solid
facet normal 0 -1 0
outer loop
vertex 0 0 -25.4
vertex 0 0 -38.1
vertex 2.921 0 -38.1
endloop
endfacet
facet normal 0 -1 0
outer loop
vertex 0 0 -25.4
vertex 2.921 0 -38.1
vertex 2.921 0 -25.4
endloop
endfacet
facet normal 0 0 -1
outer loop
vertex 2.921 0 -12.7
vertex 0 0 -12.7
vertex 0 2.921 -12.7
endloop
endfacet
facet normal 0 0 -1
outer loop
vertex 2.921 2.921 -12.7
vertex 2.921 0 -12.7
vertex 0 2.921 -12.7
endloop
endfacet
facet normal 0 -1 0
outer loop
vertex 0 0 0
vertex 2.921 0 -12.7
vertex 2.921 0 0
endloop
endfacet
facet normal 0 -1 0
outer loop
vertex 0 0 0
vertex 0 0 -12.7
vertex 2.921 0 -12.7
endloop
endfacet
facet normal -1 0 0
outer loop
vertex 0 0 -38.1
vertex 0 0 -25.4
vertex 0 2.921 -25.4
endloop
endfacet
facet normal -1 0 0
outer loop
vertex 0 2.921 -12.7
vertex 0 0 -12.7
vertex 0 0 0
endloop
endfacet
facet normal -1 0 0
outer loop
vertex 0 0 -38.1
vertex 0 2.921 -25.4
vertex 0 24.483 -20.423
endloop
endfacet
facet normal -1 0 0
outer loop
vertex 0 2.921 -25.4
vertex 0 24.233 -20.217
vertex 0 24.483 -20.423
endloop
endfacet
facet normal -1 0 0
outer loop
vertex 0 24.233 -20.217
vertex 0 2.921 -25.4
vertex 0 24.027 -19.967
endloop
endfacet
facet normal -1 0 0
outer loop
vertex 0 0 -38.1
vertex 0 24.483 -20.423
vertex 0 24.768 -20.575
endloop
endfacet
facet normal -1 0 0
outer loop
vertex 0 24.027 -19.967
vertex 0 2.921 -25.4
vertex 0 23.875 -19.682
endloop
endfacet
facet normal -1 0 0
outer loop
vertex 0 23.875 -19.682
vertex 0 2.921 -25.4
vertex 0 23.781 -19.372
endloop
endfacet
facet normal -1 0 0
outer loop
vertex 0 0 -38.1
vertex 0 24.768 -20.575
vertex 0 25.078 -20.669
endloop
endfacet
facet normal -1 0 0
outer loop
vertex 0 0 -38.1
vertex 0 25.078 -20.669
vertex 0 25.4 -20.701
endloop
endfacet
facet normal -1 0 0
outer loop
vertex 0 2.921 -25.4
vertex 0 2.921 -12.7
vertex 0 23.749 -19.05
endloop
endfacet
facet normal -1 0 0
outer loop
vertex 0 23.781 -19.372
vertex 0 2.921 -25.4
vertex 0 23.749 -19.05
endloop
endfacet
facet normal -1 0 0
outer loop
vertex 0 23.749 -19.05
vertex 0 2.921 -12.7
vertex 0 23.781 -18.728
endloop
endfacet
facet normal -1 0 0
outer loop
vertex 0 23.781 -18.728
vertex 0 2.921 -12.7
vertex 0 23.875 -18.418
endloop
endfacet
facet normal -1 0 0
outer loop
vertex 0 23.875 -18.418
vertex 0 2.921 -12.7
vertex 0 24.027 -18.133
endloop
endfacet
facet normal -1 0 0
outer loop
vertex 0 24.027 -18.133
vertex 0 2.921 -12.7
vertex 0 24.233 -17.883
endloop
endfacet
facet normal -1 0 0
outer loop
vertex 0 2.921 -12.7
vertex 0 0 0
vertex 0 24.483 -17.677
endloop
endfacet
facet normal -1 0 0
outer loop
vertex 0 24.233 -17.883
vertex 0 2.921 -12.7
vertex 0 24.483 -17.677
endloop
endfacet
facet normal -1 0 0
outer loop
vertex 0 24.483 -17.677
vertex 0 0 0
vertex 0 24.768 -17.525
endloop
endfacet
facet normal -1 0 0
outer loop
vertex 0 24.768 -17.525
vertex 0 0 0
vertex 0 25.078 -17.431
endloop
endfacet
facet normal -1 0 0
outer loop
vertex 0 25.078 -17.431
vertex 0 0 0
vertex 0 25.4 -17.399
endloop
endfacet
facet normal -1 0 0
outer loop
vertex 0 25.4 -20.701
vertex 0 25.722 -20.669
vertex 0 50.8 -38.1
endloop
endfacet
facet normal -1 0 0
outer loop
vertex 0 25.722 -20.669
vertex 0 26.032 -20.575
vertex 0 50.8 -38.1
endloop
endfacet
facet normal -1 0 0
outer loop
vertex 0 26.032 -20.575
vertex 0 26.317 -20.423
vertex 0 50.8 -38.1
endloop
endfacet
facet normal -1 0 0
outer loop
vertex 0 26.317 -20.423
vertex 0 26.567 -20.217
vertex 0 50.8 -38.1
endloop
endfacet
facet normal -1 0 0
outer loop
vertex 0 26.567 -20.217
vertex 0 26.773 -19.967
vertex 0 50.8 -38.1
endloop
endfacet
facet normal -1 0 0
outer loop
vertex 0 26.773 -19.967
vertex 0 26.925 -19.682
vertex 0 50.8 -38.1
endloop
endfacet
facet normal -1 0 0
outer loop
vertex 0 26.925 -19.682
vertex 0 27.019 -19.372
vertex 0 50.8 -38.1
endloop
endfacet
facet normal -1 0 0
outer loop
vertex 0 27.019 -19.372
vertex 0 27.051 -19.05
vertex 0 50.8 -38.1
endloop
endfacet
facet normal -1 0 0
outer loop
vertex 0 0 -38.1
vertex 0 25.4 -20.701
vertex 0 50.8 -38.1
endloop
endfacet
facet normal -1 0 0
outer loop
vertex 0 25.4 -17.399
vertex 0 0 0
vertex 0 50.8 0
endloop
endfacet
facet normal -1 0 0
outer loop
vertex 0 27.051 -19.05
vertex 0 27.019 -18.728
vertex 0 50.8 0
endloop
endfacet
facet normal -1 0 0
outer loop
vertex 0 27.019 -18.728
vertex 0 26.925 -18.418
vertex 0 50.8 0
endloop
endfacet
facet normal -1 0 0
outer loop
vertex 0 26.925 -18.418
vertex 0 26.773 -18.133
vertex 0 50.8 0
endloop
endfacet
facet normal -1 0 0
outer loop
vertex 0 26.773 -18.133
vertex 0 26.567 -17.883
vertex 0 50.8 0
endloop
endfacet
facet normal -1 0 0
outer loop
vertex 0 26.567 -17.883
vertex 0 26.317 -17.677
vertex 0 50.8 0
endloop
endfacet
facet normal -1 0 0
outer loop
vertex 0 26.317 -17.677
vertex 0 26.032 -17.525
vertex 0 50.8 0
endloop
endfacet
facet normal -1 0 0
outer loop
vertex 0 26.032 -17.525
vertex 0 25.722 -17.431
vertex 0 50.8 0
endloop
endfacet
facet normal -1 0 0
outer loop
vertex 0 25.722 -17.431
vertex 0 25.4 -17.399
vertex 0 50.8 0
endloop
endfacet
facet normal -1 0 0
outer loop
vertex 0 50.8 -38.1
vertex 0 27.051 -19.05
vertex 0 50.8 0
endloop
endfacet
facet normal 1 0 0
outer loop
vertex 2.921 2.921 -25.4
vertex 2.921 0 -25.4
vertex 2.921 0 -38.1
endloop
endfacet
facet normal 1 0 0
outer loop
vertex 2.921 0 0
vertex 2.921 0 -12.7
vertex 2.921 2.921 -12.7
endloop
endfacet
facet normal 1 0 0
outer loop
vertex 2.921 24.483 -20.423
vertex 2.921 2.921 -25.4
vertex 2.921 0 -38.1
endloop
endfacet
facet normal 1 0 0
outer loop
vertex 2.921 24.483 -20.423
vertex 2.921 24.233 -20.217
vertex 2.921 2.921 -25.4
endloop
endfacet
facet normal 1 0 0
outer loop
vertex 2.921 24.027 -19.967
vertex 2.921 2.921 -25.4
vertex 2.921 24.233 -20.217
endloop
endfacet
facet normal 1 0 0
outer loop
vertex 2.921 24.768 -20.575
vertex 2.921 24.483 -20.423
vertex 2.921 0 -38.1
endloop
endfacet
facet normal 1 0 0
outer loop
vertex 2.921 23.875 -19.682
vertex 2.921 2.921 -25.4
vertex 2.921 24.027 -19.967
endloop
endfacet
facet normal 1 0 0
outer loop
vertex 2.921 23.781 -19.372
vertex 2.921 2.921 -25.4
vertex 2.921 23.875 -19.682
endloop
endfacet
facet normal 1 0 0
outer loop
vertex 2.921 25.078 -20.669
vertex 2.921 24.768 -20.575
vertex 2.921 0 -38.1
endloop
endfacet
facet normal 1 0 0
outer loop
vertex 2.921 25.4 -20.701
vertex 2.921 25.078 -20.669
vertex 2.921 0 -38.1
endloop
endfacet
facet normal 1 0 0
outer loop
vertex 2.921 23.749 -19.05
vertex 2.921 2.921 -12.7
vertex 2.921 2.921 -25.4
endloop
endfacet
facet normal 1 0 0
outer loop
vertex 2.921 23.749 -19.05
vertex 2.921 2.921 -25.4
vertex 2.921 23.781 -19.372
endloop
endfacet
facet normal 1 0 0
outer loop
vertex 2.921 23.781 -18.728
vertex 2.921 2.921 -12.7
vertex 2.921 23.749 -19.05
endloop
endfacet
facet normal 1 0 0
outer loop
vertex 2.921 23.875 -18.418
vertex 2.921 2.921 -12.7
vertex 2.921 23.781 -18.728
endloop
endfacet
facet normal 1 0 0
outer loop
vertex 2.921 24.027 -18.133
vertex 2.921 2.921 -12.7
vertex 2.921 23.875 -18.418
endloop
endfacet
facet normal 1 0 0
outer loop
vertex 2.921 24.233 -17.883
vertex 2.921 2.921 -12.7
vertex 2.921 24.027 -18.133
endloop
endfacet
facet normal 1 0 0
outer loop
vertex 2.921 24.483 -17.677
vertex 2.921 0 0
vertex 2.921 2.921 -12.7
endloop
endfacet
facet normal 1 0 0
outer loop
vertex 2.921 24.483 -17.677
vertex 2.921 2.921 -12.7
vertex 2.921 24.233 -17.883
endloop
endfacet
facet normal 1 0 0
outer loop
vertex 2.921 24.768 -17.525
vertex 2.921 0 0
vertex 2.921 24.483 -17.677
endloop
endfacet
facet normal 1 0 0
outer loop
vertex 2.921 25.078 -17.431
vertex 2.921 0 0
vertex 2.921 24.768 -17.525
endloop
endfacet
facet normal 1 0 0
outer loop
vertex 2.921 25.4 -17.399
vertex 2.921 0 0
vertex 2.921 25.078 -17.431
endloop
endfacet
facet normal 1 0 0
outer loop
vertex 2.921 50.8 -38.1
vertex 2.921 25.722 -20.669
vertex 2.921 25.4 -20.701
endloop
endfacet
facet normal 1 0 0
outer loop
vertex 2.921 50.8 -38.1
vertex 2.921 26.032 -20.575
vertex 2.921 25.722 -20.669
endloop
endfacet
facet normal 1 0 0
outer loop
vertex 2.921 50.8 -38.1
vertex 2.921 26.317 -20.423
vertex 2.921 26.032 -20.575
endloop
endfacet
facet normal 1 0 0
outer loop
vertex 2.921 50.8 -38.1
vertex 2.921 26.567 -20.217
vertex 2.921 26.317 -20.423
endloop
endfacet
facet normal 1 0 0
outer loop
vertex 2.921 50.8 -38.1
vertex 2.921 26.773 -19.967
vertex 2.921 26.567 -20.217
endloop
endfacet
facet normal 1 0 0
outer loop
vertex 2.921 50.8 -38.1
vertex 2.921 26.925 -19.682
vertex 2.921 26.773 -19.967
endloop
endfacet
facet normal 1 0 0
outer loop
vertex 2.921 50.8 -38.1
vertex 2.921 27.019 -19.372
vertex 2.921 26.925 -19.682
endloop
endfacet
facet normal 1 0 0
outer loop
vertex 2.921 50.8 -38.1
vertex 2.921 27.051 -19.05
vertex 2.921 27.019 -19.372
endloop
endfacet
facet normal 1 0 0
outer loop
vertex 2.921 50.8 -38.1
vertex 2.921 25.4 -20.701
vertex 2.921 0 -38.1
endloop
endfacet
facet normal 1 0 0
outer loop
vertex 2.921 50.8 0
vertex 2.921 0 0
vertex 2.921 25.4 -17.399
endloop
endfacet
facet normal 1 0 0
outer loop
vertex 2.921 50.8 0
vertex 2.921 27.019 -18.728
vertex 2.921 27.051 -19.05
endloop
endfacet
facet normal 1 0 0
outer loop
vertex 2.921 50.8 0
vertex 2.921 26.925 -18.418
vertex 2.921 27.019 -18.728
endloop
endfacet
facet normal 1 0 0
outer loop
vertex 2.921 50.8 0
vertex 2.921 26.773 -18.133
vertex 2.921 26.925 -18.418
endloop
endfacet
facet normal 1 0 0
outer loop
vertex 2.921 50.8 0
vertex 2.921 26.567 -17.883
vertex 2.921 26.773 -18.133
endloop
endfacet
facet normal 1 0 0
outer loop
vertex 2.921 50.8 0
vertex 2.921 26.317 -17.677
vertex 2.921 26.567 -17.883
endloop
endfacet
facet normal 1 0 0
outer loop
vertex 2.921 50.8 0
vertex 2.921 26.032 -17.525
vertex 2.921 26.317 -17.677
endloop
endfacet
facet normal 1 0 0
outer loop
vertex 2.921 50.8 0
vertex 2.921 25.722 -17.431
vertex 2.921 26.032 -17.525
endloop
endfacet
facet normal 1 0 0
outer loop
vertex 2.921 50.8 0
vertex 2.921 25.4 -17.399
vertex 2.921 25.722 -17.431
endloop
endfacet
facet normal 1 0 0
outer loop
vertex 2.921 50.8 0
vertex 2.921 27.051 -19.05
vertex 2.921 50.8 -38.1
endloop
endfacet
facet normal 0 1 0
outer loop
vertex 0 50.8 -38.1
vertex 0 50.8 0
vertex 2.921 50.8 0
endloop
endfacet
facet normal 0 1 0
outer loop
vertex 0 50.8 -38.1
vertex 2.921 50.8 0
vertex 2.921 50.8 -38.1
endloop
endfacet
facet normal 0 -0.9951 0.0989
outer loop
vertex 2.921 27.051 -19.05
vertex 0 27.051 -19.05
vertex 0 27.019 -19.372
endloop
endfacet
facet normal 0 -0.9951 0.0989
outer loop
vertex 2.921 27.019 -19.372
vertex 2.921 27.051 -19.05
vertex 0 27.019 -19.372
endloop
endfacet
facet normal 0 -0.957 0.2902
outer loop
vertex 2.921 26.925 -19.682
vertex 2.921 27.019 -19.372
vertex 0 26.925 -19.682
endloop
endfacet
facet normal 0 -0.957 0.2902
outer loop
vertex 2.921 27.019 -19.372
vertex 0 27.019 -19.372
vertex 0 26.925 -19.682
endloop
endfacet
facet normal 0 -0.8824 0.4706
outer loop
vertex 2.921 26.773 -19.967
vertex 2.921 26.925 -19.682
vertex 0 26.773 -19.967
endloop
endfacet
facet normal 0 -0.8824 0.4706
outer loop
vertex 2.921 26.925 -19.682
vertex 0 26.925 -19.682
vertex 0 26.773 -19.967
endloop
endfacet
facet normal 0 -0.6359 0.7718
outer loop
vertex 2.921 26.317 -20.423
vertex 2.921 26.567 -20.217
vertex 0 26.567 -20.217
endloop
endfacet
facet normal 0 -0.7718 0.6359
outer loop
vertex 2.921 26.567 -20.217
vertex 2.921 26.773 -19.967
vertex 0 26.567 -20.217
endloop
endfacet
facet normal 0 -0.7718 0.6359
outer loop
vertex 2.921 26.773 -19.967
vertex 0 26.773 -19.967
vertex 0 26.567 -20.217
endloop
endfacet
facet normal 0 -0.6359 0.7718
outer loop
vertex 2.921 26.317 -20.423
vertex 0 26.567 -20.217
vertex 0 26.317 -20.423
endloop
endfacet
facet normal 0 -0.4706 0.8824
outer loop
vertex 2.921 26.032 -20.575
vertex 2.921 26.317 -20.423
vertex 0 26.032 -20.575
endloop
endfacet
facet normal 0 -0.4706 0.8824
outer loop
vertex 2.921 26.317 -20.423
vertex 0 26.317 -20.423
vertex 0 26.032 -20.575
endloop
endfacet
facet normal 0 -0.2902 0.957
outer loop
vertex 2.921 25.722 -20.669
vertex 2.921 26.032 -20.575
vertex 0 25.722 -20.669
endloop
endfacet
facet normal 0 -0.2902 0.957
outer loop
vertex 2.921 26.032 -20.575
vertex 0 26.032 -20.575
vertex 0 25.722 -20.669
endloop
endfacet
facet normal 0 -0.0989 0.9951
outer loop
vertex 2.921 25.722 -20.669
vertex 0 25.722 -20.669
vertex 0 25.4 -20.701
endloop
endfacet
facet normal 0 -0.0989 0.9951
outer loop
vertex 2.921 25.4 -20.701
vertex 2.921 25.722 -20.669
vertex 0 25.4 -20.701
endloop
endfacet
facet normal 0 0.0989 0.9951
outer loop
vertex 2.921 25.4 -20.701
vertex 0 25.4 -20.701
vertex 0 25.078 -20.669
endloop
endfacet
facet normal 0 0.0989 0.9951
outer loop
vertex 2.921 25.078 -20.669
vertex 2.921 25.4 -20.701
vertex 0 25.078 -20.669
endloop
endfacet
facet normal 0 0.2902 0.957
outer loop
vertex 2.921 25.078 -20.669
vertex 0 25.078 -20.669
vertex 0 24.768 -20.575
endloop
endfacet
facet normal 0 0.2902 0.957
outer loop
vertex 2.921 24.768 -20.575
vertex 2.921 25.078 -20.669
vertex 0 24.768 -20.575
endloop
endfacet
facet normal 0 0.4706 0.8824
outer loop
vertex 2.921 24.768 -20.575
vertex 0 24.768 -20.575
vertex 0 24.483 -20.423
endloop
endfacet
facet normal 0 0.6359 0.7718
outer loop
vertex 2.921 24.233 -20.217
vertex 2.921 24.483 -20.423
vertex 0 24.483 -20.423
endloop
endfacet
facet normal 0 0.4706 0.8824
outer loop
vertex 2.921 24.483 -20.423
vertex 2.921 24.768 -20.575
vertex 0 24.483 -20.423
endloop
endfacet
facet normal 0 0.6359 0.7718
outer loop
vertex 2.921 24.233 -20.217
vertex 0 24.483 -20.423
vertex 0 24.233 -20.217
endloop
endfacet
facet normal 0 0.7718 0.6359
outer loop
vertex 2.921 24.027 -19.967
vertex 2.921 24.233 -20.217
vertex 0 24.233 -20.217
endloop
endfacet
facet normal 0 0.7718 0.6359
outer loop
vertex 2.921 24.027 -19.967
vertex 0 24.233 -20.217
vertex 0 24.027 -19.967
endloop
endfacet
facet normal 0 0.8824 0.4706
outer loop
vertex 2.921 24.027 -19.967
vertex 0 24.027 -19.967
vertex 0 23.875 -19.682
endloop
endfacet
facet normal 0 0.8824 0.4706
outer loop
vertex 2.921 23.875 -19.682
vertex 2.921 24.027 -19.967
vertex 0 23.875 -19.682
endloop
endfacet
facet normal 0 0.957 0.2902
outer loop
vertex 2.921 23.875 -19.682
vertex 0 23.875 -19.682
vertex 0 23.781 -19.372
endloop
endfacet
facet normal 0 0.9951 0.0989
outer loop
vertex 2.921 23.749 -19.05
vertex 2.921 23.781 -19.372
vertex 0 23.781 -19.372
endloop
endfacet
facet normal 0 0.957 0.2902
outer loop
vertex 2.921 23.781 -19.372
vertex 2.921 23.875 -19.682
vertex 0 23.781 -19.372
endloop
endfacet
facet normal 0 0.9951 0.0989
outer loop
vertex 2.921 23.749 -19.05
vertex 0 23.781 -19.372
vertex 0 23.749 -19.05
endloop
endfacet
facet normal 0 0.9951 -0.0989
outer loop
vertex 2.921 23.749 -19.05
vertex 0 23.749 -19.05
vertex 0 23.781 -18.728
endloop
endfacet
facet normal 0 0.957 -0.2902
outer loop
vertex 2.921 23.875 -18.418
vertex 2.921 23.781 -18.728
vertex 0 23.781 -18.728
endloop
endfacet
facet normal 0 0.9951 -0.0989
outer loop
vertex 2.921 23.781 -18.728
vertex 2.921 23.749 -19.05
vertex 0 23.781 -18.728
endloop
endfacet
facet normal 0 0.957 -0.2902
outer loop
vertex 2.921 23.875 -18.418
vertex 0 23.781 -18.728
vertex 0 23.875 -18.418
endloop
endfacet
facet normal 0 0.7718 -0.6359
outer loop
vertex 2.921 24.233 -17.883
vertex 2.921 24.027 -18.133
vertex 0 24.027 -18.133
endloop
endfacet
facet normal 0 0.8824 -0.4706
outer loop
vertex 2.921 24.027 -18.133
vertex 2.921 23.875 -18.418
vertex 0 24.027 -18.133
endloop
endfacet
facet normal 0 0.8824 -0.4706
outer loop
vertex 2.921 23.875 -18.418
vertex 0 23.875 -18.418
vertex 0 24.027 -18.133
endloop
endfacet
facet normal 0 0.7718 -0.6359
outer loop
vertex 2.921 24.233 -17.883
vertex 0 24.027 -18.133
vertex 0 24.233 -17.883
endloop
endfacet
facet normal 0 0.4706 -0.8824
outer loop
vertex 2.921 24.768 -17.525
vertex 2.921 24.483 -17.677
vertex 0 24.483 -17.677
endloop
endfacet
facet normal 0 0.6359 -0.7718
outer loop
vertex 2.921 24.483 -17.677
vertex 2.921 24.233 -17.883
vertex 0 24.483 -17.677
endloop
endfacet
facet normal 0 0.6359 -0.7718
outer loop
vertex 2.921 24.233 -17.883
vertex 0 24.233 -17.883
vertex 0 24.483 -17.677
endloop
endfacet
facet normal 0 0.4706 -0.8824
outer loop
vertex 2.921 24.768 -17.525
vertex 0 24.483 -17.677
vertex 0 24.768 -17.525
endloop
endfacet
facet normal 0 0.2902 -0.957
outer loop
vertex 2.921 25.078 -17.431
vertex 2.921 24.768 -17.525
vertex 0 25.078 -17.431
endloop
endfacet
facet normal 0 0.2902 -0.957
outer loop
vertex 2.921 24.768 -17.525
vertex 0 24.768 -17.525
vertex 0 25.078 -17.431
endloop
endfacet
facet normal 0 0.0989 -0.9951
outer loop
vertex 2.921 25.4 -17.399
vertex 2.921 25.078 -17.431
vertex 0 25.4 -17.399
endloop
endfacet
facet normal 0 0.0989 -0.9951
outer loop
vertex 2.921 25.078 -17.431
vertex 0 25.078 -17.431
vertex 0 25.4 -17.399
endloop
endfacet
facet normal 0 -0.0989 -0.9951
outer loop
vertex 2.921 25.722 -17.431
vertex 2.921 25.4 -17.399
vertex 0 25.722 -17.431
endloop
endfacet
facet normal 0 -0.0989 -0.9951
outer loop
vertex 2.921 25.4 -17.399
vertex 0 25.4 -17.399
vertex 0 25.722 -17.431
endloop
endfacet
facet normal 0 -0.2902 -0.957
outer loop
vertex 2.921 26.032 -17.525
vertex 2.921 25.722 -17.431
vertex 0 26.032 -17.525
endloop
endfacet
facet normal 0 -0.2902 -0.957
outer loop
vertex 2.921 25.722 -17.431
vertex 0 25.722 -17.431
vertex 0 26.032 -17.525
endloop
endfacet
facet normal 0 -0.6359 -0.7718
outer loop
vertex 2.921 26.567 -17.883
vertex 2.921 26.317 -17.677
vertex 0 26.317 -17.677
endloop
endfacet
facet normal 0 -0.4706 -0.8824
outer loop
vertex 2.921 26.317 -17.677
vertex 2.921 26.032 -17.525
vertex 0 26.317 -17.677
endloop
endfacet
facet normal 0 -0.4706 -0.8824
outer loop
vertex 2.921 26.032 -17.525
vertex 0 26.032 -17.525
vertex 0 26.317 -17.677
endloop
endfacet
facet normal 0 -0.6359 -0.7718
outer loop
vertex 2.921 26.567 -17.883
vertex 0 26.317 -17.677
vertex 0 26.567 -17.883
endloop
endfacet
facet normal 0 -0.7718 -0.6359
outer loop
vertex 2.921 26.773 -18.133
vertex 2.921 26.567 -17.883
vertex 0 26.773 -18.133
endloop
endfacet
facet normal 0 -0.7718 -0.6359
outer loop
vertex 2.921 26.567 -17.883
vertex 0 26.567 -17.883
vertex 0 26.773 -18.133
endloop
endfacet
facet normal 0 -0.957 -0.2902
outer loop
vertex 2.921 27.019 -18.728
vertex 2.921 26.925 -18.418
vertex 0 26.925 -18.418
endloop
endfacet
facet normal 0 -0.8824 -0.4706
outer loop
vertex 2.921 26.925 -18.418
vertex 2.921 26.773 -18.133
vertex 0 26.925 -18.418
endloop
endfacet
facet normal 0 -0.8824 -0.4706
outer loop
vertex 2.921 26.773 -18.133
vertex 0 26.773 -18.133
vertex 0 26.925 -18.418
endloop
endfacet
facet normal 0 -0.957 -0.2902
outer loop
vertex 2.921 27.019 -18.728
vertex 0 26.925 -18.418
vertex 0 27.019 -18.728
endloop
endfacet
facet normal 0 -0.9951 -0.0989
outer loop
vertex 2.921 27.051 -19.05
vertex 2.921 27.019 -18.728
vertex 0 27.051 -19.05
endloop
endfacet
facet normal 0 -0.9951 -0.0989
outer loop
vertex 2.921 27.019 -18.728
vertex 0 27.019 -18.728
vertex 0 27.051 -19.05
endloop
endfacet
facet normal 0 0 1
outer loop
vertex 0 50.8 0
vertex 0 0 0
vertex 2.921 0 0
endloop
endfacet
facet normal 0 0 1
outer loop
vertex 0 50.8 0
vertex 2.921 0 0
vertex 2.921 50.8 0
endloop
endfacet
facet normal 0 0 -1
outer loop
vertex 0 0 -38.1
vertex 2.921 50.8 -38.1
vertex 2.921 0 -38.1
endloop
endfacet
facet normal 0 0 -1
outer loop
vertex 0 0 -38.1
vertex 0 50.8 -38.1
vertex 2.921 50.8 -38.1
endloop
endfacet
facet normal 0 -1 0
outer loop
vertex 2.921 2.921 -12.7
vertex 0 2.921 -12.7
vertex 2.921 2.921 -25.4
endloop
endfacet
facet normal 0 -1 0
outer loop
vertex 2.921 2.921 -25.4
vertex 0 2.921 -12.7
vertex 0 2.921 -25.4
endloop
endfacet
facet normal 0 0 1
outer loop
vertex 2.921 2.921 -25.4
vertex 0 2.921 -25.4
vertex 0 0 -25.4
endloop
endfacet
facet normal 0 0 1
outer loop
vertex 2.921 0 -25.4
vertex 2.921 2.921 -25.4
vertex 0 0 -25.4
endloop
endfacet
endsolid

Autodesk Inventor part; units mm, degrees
ref_plane "YZ Plane" through (0, 0, 0) normal (1, 0, 0) x (0, 1, 0)
ref_plane "XZ Plane" through (0, 0, 0) normal (0, 1, 0) x (-1, 0, 0)
ref_plane "XY Plane" through (0, 0, 0) normal (0, 0, 1) x (1, 0, 0)
sketch "Sketch1" plane through (0, 0, 0) normal (1, 0, 0) x (0, 1, 0)
  line L0 (0, 0) -> (50.8, 0)
  line L1 (50.8, 0) -> (50.8, -38.1)
  line L2 (50.8, -38.1) -> (0, -38.1)
  circle A0 centre (25.4, -19.05) radius 1.651
  line L3 (0, -12.7) -> (2.921, -12.7)
  line L4 (2.921, -12.7) -> (2.921, -25.4)
  line L5 (2.921, -25.4) -> (0, -25.4)
  line L6 (0, -38.1) -> (0, -25.4)
  line L7 (0, -12.7) -> (0, 0)
  dimension "d0" = 50.8
  dimension "d1" = 38.1
  dimension "d2" = 3.302
  dimension "d9" = 12.7
  dimension "d10" = 12.7
  dimension "d11" = 2.921
extrude "Extrusion1" add sketch "Sketch1" along normal blind 2.921
properties part number "wheelsupport"
